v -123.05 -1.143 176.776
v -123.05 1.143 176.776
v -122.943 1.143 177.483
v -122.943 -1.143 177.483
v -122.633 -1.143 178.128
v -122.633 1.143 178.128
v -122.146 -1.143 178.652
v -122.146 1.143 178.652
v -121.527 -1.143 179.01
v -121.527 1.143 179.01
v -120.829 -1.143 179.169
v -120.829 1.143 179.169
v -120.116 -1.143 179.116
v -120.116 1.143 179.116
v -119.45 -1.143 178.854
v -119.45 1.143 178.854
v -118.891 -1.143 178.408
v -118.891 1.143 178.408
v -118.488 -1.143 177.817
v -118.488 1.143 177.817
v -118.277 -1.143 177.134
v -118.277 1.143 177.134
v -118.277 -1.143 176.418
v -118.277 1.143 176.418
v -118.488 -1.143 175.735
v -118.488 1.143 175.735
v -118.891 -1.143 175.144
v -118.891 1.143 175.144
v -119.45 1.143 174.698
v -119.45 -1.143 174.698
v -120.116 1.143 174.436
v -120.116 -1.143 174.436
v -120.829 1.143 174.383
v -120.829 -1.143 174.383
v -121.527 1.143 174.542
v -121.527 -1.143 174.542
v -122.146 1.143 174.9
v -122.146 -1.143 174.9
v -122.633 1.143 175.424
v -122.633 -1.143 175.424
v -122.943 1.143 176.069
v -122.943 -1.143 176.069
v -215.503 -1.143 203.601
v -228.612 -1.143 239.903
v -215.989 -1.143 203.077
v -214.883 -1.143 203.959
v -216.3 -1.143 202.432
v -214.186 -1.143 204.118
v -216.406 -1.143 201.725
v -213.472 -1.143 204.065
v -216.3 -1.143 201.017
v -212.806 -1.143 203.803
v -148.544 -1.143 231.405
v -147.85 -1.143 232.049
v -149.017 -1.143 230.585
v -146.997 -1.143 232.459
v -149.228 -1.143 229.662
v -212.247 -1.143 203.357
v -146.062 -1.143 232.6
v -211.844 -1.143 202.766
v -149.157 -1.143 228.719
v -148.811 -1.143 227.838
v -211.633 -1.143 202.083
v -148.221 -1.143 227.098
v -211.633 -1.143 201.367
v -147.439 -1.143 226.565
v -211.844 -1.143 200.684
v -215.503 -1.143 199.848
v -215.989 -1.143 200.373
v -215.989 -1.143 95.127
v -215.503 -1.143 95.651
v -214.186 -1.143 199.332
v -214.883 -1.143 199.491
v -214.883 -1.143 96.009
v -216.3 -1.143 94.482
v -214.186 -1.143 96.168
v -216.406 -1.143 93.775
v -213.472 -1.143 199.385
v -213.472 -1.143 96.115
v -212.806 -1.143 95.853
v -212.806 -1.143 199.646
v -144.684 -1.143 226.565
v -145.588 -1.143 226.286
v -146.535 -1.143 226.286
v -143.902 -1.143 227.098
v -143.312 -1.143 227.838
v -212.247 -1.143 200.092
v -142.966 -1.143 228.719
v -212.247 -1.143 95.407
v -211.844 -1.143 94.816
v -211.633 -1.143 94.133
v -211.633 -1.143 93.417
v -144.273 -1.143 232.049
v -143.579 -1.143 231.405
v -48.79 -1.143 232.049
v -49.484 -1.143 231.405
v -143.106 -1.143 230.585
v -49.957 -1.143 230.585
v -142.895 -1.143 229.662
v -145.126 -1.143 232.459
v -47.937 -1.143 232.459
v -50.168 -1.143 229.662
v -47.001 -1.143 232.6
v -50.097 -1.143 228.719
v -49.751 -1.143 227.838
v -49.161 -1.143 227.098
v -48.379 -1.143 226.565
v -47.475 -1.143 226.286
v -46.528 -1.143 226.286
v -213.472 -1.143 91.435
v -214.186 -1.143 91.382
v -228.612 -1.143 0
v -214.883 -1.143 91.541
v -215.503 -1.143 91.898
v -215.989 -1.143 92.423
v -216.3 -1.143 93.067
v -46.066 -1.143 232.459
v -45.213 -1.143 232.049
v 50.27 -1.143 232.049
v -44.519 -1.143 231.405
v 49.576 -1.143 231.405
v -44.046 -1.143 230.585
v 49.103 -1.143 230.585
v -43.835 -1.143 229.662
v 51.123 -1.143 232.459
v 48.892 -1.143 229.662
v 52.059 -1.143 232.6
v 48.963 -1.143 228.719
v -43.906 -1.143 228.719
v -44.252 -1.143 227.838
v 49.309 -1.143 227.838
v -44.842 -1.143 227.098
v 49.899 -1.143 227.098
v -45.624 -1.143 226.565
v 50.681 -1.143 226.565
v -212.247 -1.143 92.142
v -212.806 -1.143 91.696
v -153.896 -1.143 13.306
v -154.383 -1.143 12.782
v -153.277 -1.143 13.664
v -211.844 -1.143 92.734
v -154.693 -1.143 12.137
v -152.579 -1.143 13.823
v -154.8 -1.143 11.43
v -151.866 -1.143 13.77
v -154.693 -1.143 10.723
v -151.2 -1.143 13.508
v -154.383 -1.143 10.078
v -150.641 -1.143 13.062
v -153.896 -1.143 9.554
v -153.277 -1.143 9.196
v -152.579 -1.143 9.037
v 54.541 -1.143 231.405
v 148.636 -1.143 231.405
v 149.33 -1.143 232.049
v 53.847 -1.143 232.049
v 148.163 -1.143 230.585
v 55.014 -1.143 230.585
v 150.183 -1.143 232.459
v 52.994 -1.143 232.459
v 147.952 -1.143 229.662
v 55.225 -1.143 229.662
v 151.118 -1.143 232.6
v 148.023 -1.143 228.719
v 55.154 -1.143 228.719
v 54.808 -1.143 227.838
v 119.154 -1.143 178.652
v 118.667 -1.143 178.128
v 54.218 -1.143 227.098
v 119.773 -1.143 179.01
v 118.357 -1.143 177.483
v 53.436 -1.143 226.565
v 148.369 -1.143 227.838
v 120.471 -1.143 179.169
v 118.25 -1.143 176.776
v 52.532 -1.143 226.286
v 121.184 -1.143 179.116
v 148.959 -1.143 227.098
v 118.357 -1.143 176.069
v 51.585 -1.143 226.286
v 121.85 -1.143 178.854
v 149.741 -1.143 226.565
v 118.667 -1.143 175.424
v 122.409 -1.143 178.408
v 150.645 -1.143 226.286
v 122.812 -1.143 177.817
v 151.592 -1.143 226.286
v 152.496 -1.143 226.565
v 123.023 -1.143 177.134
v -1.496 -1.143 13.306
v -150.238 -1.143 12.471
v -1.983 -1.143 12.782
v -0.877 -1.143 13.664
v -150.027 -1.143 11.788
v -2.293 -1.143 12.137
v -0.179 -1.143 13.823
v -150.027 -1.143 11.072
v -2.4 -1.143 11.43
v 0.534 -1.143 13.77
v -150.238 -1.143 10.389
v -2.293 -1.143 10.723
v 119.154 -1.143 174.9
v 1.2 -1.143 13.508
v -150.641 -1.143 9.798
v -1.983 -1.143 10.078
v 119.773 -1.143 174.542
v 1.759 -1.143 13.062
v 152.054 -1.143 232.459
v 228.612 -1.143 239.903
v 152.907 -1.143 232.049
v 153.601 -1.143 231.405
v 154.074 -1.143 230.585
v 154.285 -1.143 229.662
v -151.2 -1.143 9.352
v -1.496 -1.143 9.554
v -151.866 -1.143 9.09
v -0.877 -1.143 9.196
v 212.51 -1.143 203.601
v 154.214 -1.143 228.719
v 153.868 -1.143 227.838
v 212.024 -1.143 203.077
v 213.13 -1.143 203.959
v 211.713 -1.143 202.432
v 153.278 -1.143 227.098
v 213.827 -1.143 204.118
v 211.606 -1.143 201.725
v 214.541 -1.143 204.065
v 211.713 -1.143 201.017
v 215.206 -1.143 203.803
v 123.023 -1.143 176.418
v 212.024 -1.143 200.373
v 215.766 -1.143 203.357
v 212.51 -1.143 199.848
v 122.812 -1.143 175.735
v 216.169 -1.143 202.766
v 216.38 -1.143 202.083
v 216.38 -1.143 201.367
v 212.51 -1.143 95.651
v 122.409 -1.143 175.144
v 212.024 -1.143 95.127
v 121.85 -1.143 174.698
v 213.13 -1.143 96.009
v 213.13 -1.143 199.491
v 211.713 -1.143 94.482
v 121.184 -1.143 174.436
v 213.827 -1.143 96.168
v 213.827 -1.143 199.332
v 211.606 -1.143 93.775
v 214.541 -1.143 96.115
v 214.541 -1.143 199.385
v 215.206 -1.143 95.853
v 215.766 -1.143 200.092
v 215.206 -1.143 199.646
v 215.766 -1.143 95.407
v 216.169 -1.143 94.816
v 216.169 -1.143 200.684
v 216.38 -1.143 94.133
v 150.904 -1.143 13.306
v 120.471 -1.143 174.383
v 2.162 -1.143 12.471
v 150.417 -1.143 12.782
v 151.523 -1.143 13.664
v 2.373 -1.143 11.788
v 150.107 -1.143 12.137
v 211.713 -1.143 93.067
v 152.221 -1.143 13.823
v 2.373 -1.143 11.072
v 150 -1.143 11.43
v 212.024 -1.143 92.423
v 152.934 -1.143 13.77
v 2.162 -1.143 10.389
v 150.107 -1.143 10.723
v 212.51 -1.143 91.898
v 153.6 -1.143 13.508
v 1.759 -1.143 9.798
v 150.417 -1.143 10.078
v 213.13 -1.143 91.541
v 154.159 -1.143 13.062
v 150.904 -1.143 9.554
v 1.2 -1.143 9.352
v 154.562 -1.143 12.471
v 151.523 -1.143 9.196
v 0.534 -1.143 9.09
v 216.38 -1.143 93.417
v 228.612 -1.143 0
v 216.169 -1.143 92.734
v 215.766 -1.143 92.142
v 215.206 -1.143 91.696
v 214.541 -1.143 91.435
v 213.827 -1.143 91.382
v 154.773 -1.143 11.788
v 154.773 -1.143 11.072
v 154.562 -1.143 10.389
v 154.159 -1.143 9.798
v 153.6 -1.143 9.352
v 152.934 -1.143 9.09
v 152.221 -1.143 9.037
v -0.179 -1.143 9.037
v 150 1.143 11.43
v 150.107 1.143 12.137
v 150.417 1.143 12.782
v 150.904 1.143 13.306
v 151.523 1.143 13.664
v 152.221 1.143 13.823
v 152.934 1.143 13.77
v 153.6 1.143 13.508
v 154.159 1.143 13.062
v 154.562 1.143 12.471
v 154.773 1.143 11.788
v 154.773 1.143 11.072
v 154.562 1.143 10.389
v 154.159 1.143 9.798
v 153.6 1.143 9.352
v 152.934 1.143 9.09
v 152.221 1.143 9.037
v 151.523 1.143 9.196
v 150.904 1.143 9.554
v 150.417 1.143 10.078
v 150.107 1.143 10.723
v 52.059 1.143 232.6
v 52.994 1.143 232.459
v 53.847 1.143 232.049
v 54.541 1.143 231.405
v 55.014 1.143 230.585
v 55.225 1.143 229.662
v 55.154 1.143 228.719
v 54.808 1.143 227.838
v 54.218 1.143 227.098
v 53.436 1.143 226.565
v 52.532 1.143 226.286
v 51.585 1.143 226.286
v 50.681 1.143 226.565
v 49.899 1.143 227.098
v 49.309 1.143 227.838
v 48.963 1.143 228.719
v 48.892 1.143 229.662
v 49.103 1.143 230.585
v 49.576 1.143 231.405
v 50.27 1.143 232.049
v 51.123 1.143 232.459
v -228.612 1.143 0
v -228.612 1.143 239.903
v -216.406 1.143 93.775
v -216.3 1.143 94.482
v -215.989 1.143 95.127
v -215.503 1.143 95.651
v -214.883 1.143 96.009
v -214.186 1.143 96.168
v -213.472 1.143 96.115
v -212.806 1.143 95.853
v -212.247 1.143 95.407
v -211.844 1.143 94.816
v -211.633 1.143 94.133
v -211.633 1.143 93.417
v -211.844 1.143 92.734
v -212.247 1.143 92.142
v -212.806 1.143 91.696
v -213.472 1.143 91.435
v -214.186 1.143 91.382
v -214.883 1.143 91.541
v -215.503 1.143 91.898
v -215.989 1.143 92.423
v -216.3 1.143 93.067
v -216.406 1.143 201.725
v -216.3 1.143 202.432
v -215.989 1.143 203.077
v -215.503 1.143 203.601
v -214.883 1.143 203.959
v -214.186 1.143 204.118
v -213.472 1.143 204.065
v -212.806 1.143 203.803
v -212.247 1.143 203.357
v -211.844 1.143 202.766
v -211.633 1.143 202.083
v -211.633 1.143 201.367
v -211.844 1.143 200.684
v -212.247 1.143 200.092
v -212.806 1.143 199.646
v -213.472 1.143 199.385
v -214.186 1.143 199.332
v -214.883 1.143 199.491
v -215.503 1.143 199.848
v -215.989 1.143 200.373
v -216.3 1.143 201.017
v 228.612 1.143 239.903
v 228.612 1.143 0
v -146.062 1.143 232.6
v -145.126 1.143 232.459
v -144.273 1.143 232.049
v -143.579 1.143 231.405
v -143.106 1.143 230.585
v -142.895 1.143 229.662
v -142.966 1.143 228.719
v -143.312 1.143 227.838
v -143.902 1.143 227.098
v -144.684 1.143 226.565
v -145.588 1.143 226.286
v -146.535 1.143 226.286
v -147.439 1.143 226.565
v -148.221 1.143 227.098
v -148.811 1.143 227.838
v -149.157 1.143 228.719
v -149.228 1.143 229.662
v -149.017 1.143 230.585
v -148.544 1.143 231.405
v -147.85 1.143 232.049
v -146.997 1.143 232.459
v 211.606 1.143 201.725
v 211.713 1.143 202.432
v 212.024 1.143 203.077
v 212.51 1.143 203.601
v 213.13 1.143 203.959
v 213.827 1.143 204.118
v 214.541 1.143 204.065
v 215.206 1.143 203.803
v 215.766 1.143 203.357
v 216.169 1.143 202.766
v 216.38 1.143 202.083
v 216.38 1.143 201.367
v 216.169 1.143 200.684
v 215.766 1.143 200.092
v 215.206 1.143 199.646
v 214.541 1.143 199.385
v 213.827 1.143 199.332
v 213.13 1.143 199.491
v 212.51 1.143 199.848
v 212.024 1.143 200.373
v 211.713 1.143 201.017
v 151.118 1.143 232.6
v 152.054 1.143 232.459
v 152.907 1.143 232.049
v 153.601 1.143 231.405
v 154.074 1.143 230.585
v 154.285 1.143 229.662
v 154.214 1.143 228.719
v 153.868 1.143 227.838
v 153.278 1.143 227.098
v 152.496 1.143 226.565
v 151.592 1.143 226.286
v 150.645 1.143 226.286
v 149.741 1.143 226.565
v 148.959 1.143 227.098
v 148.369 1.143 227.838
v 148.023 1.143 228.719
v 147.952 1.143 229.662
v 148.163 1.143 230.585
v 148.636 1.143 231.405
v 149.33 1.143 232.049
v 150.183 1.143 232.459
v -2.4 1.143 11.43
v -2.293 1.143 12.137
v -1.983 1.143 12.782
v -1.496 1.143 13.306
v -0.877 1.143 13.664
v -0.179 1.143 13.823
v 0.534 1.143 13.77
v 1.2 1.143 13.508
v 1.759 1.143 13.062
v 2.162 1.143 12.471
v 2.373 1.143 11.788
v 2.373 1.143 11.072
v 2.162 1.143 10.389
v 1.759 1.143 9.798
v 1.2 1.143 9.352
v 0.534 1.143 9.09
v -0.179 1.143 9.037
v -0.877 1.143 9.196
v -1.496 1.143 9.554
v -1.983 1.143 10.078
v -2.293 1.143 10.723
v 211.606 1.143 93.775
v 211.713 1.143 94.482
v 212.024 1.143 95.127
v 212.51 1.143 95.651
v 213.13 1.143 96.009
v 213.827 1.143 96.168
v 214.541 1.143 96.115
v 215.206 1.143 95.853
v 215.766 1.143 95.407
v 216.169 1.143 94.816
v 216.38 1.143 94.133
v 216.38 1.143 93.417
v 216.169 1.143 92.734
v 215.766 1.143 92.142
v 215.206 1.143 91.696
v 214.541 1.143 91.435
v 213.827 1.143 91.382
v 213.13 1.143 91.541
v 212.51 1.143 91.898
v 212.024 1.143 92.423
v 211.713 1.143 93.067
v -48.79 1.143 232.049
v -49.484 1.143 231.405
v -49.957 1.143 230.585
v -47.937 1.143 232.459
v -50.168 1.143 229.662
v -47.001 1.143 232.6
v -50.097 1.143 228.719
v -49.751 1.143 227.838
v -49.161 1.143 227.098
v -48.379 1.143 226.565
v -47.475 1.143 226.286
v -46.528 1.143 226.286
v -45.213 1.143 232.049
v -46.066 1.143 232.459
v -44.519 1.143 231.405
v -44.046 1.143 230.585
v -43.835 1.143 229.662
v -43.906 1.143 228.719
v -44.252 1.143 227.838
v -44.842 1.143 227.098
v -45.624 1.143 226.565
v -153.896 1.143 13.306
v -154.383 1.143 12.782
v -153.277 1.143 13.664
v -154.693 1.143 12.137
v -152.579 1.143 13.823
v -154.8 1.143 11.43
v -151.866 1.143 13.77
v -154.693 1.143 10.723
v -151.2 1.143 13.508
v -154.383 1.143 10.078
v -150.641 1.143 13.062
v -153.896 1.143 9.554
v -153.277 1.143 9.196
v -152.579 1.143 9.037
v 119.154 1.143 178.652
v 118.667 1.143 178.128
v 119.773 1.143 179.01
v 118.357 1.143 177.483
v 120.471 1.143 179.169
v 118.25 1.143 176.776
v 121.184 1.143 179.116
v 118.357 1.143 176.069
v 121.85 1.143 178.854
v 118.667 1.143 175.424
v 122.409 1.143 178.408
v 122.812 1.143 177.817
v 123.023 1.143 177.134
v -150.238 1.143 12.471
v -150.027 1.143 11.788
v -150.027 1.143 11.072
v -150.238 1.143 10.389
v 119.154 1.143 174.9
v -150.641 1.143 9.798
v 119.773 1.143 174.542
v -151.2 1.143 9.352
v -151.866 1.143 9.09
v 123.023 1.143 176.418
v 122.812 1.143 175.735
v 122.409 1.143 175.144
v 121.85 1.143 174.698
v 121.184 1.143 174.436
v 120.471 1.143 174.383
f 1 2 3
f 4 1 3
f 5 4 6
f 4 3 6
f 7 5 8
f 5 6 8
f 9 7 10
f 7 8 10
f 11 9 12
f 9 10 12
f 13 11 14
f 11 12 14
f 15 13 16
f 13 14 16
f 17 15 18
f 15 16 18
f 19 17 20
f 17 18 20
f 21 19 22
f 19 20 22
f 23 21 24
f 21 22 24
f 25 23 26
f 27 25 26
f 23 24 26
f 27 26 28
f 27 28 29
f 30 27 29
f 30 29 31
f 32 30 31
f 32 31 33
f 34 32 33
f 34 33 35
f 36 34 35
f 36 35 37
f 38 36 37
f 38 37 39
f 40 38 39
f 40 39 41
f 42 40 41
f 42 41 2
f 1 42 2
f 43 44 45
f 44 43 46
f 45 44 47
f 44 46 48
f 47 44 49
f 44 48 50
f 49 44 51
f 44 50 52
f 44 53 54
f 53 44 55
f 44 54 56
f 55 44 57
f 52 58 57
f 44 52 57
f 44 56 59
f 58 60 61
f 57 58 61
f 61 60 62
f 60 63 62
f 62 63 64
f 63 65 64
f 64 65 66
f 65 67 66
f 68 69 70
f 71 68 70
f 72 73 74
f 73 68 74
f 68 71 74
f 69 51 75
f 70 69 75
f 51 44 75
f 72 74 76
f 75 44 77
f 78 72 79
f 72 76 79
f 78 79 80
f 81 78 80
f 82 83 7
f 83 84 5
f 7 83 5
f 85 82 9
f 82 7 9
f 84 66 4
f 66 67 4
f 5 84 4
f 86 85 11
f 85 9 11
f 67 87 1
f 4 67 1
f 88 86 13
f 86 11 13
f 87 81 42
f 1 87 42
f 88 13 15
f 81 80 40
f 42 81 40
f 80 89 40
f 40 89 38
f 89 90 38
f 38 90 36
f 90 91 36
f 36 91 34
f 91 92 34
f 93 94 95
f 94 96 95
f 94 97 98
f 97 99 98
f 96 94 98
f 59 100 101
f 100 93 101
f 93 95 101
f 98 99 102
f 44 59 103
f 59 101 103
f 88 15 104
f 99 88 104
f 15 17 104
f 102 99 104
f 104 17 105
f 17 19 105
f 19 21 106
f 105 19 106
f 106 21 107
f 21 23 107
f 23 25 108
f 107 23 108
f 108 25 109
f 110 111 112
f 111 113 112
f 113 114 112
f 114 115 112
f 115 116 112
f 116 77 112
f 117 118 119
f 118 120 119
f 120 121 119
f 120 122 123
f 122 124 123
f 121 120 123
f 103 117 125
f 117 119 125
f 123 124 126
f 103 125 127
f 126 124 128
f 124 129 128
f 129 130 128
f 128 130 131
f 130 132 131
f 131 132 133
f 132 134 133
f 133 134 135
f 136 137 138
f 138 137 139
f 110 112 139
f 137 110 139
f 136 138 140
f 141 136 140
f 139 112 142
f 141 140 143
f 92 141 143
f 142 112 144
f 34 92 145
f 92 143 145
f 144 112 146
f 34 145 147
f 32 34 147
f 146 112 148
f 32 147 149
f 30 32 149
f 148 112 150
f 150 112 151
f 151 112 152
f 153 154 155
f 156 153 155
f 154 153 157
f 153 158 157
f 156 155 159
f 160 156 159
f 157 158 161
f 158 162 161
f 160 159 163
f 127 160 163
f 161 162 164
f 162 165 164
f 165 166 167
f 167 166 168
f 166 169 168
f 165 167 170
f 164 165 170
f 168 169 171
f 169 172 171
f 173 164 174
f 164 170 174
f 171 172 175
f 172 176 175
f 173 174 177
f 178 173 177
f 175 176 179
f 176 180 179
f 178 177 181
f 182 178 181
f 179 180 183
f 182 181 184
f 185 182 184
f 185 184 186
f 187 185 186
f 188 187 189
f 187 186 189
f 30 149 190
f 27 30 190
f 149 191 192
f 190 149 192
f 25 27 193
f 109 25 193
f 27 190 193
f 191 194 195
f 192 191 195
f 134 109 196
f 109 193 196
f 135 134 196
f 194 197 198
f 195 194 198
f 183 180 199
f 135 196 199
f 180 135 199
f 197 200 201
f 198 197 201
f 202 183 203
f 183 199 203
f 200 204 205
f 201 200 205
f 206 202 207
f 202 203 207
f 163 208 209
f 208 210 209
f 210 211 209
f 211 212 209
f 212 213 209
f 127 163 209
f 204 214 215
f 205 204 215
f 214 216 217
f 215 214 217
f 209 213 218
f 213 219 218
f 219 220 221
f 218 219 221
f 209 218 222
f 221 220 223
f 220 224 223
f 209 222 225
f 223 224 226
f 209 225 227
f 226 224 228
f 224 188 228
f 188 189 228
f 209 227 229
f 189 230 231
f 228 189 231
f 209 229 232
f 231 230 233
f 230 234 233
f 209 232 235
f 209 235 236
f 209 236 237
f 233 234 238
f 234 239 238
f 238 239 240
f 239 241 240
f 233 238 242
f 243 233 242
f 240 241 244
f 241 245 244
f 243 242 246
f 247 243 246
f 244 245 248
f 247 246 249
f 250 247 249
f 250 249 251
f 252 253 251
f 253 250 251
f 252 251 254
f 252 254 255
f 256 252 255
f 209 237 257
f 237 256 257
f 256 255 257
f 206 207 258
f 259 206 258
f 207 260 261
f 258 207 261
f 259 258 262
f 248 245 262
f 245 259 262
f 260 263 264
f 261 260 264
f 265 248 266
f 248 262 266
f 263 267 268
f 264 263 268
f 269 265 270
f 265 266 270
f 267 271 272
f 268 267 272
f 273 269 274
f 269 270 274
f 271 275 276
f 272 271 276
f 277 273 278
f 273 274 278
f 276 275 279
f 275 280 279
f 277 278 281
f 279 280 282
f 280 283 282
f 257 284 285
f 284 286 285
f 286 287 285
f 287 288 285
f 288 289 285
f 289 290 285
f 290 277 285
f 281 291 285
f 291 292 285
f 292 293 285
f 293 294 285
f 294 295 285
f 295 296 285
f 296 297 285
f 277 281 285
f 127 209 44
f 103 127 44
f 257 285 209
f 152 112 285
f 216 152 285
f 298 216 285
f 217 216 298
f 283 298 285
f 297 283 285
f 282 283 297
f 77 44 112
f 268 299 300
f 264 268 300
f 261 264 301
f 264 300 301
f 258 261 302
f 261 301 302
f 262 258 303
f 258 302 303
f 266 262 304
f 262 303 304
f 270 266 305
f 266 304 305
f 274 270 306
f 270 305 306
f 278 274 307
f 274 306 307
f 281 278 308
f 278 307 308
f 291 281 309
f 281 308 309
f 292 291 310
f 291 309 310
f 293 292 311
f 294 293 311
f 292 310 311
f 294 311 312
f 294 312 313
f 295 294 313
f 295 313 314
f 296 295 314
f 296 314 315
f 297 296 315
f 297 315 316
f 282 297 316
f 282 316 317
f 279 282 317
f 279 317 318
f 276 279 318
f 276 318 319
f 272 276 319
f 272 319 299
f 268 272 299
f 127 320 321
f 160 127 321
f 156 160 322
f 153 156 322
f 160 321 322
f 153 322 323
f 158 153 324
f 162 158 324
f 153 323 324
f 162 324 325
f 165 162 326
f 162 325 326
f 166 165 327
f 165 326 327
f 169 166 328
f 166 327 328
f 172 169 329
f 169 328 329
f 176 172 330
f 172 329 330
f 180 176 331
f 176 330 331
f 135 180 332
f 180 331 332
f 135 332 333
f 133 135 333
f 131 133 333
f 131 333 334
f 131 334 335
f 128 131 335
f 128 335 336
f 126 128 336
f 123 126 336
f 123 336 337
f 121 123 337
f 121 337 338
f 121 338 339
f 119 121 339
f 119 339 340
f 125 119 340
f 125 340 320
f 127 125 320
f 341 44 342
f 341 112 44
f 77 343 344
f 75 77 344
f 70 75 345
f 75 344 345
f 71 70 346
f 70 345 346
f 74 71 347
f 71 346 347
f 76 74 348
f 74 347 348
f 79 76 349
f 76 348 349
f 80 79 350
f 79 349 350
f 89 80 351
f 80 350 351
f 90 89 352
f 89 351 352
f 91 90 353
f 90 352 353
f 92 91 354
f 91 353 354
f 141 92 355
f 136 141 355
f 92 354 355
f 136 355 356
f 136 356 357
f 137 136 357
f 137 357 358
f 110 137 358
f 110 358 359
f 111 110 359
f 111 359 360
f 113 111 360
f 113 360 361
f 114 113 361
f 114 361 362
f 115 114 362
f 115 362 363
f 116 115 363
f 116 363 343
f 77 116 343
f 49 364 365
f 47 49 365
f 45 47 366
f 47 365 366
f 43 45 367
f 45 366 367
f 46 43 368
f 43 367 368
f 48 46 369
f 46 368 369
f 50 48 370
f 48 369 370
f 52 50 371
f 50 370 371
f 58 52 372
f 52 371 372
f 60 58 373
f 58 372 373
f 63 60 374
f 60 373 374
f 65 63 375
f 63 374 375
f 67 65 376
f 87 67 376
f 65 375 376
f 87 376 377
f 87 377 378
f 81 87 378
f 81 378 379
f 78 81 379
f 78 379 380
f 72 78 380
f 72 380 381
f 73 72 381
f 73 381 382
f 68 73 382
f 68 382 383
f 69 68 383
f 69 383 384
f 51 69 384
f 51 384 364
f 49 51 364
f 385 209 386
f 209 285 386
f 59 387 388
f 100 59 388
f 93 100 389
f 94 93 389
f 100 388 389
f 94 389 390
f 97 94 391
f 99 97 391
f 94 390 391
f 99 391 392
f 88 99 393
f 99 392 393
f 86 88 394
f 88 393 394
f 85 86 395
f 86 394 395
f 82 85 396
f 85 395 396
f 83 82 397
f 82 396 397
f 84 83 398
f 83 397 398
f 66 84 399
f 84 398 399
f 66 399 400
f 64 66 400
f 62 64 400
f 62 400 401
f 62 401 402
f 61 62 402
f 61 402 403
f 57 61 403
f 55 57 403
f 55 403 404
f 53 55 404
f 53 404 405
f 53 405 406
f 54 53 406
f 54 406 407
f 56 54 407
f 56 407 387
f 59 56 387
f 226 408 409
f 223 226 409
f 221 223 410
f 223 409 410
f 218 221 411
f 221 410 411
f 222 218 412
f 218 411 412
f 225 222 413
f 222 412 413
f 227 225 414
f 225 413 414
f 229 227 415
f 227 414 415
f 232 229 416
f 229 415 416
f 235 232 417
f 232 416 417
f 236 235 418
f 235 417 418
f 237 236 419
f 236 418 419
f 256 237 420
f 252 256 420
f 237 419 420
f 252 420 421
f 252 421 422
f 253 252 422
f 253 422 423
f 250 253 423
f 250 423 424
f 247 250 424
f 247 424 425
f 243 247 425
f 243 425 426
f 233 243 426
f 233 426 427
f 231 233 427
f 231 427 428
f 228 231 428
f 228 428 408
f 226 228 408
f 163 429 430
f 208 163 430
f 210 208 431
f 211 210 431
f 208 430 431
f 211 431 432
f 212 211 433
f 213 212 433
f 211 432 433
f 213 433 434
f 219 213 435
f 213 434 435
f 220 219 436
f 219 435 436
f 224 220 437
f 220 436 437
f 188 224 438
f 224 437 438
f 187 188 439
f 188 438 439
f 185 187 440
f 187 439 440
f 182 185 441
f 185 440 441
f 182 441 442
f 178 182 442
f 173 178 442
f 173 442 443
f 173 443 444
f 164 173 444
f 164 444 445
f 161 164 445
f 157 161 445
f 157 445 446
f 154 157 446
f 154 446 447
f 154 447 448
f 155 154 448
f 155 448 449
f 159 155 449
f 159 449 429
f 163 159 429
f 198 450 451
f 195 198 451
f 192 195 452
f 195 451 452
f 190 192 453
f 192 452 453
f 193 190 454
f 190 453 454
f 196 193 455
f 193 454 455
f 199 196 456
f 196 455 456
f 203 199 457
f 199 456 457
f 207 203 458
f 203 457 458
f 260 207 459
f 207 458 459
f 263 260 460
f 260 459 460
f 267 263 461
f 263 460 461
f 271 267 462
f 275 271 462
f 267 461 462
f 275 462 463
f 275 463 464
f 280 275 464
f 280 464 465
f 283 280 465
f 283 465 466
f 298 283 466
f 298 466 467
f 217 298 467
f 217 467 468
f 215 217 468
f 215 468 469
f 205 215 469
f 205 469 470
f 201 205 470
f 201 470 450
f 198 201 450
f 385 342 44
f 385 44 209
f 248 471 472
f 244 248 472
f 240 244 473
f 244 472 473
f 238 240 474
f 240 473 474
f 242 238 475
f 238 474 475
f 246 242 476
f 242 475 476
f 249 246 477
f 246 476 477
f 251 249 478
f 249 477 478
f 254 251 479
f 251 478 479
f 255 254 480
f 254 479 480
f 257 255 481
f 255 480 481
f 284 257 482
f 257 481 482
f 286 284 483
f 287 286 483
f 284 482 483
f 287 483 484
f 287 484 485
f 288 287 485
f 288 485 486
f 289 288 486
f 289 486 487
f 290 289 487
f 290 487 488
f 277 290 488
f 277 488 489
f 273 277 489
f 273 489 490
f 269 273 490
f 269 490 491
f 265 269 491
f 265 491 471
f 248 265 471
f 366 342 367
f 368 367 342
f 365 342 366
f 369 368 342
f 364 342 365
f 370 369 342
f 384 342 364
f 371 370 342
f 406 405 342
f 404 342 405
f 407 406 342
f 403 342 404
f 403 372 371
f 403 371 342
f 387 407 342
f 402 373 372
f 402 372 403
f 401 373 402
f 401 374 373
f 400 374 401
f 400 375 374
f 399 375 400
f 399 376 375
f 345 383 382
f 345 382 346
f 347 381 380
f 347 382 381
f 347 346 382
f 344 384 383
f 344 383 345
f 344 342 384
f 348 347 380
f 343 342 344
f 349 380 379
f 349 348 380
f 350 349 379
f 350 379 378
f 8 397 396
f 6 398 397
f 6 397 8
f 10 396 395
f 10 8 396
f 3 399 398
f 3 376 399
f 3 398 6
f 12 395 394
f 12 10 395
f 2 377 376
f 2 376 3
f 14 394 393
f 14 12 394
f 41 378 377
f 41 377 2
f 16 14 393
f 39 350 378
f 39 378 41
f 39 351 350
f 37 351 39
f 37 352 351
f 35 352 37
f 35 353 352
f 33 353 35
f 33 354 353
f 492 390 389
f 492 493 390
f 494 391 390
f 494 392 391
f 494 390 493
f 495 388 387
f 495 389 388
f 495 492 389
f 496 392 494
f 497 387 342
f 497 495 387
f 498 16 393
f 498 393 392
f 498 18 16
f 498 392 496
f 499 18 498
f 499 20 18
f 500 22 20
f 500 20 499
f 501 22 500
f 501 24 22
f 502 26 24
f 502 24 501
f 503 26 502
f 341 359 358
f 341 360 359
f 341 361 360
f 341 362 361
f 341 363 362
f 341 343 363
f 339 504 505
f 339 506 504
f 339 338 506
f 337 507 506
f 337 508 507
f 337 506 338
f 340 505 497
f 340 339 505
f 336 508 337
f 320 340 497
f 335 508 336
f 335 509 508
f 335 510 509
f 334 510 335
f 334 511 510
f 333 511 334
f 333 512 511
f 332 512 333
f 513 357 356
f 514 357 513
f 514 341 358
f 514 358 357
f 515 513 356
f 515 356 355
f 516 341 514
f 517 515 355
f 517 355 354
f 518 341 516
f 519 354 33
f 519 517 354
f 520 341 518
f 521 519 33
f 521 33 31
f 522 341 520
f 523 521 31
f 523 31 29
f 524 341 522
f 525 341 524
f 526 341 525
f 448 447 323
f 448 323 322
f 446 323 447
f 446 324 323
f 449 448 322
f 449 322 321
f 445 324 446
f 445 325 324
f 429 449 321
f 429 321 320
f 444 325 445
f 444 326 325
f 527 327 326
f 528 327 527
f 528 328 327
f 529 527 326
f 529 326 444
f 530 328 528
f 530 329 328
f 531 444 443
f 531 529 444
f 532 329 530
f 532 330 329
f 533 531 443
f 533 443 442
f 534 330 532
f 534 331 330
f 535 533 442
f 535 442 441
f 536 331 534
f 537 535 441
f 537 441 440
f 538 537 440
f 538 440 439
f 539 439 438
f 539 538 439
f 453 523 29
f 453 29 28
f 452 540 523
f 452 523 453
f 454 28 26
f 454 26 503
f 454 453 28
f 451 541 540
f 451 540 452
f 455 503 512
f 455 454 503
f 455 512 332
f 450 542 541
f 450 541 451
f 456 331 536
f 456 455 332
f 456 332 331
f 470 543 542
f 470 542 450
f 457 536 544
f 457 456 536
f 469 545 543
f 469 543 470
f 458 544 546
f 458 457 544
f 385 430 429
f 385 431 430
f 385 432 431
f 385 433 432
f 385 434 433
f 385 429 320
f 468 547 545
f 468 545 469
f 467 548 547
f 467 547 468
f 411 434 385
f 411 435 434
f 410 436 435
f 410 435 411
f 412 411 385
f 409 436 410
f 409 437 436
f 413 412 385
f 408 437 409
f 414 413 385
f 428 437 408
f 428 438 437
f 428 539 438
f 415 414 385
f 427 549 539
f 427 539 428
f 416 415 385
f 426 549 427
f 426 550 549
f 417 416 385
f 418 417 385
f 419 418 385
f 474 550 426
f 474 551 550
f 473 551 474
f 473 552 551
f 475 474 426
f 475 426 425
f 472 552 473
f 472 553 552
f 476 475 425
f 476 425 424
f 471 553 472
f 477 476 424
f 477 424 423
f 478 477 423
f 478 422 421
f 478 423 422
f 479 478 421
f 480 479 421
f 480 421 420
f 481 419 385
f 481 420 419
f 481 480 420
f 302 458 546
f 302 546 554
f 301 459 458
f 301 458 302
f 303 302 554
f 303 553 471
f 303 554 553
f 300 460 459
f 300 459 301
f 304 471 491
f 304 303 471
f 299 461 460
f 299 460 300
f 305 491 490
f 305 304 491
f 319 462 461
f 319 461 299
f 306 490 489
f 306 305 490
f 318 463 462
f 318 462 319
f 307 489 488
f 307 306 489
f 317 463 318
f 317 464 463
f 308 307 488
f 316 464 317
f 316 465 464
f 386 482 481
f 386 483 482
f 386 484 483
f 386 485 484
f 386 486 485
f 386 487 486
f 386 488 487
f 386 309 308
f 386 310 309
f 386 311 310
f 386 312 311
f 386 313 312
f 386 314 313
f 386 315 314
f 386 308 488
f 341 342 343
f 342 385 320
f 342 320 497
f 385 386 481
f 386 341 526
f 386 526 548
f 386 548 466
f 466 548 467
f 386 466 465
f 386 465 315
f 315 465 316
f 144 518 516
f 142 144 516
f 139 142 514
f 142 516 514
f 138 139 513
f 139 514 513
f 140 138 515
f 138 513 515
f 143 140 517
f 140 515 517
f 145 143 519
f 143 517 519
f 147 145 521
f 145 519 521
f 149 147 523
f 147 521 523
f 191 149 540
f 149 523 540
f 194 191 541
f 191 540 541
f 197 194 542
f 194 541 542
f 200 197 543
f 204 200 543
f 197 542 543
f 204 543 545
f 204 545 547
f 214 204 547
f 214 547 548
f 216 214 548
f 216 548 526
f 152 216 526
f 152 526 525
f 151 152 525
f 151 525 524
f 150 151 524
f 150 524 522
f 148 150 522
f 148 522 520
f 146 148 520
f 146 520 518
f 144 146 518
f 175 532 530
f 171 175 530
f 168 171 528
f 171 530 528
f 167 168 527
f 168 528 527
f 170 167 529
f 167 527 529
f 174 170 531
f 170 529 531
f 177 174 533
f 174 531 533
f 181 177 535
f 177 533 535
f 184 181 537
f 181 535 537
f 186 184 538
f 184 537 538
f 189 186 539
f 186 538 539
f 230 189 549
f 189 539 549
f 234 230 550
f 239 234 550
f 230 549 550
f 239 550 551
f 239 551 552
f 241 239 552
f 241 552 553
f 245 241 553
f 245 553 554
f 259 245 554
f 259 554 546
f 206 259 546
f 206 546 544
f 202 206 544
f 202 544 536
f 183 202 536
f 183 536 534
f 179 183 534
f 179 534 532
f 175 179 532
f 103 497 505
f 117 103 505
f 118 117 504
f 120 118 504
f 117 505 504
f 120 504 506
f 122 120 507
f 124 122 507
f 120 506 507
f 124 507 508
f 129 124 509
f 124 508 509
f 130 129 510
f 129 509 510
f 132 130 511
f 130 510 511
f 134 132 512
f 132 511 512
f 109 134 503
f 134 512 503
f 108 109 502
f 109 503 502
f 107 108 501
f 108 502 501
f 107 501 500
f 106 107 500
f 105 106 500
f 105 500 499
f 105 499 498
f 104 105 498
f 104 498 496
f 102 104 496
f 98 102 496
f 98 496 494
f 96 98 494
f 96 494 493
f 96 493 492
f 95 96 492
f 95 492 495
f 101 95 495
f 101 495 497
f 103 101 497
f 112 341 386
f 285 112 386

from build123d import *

# Parameters (mm, degrees)
SKETCH1_W            = 457.223
SKETCH1_H            = 2.286
BOSS_EXTRUDE1_DEPTH  = 238.315200026
SKETCH9_R            = 3.175
CUT_EXTRUDE10_DEPTH  = 2.54
LPATTERN1_COUNT      = 4
LPATTERN1_PITCH      = 99.06
SKETCH15_W           = 457.223
SKETCH15_H           = 2.286
BOSS_EXTRUDE3_DEPTH  = 1.5875
M4_CLEARANCE_HOLE1_D = 4.8


with BuildPart() as part:
    # Sketch1 → Boss-Extrude1 (new body)
    with BuildSketch(Plane.XY):
        Rectangle(SKETCH1_W, SKETCH1_H)
    extrude(amount=BOSS_EXTRUDE1_DEPTH)

    # Sketch9 → Cut-Extrude10 (cut)
    with BuildSketch(Plane(origin=(0, 1.143, 0), x_dir=(1, 0, 0), z_dir=(0, 1, 0))):
        with Locations(Location((-146.0615, -229.425200026, 0), (0, 0, 270))):
            Circle(SKETCH9_R)
    cut_extrude10 = extrude(amount=-CUT_EXTRUDE10_DEPTH, mode=Mode.SUBTRACT)

    # LPattern1: Cut-Extrude10 ×4
    with Locations(*[(i * LPATTERN1_PITCH, 0, 0) for i in range(1, LPATTERN1_COUNT)]):
        add(cut_extrude10, mode=Mode.SUBTRACT)

    # Sketch15 → Boss-Extrude3 (add)
    with BuildSketch(Plane.XY.offset(238.315200026)):
        Rectangle(SKETCH15_W, SKETCH15_H)
    extrude(amount=BOSS_EXTRUDE3_DEPTH)

    # M4 Clearance Hole1 (through all)
    with Locations(Plane.XZ.offset(1.143)):
        with Locations((-214.0065, 201.724823778), (-214.0065, 93.774823778), (-152.4, 11.43), (0, 11.43), (152.4, 11.43), (214.0065, 93.774823778), (214.0065, 201.724823778), (120.65, 176.776), (-120.65, 176.776)):
            Hole(M4_CLEARANCE_HOLE1_D / 2)


solid = part.part
